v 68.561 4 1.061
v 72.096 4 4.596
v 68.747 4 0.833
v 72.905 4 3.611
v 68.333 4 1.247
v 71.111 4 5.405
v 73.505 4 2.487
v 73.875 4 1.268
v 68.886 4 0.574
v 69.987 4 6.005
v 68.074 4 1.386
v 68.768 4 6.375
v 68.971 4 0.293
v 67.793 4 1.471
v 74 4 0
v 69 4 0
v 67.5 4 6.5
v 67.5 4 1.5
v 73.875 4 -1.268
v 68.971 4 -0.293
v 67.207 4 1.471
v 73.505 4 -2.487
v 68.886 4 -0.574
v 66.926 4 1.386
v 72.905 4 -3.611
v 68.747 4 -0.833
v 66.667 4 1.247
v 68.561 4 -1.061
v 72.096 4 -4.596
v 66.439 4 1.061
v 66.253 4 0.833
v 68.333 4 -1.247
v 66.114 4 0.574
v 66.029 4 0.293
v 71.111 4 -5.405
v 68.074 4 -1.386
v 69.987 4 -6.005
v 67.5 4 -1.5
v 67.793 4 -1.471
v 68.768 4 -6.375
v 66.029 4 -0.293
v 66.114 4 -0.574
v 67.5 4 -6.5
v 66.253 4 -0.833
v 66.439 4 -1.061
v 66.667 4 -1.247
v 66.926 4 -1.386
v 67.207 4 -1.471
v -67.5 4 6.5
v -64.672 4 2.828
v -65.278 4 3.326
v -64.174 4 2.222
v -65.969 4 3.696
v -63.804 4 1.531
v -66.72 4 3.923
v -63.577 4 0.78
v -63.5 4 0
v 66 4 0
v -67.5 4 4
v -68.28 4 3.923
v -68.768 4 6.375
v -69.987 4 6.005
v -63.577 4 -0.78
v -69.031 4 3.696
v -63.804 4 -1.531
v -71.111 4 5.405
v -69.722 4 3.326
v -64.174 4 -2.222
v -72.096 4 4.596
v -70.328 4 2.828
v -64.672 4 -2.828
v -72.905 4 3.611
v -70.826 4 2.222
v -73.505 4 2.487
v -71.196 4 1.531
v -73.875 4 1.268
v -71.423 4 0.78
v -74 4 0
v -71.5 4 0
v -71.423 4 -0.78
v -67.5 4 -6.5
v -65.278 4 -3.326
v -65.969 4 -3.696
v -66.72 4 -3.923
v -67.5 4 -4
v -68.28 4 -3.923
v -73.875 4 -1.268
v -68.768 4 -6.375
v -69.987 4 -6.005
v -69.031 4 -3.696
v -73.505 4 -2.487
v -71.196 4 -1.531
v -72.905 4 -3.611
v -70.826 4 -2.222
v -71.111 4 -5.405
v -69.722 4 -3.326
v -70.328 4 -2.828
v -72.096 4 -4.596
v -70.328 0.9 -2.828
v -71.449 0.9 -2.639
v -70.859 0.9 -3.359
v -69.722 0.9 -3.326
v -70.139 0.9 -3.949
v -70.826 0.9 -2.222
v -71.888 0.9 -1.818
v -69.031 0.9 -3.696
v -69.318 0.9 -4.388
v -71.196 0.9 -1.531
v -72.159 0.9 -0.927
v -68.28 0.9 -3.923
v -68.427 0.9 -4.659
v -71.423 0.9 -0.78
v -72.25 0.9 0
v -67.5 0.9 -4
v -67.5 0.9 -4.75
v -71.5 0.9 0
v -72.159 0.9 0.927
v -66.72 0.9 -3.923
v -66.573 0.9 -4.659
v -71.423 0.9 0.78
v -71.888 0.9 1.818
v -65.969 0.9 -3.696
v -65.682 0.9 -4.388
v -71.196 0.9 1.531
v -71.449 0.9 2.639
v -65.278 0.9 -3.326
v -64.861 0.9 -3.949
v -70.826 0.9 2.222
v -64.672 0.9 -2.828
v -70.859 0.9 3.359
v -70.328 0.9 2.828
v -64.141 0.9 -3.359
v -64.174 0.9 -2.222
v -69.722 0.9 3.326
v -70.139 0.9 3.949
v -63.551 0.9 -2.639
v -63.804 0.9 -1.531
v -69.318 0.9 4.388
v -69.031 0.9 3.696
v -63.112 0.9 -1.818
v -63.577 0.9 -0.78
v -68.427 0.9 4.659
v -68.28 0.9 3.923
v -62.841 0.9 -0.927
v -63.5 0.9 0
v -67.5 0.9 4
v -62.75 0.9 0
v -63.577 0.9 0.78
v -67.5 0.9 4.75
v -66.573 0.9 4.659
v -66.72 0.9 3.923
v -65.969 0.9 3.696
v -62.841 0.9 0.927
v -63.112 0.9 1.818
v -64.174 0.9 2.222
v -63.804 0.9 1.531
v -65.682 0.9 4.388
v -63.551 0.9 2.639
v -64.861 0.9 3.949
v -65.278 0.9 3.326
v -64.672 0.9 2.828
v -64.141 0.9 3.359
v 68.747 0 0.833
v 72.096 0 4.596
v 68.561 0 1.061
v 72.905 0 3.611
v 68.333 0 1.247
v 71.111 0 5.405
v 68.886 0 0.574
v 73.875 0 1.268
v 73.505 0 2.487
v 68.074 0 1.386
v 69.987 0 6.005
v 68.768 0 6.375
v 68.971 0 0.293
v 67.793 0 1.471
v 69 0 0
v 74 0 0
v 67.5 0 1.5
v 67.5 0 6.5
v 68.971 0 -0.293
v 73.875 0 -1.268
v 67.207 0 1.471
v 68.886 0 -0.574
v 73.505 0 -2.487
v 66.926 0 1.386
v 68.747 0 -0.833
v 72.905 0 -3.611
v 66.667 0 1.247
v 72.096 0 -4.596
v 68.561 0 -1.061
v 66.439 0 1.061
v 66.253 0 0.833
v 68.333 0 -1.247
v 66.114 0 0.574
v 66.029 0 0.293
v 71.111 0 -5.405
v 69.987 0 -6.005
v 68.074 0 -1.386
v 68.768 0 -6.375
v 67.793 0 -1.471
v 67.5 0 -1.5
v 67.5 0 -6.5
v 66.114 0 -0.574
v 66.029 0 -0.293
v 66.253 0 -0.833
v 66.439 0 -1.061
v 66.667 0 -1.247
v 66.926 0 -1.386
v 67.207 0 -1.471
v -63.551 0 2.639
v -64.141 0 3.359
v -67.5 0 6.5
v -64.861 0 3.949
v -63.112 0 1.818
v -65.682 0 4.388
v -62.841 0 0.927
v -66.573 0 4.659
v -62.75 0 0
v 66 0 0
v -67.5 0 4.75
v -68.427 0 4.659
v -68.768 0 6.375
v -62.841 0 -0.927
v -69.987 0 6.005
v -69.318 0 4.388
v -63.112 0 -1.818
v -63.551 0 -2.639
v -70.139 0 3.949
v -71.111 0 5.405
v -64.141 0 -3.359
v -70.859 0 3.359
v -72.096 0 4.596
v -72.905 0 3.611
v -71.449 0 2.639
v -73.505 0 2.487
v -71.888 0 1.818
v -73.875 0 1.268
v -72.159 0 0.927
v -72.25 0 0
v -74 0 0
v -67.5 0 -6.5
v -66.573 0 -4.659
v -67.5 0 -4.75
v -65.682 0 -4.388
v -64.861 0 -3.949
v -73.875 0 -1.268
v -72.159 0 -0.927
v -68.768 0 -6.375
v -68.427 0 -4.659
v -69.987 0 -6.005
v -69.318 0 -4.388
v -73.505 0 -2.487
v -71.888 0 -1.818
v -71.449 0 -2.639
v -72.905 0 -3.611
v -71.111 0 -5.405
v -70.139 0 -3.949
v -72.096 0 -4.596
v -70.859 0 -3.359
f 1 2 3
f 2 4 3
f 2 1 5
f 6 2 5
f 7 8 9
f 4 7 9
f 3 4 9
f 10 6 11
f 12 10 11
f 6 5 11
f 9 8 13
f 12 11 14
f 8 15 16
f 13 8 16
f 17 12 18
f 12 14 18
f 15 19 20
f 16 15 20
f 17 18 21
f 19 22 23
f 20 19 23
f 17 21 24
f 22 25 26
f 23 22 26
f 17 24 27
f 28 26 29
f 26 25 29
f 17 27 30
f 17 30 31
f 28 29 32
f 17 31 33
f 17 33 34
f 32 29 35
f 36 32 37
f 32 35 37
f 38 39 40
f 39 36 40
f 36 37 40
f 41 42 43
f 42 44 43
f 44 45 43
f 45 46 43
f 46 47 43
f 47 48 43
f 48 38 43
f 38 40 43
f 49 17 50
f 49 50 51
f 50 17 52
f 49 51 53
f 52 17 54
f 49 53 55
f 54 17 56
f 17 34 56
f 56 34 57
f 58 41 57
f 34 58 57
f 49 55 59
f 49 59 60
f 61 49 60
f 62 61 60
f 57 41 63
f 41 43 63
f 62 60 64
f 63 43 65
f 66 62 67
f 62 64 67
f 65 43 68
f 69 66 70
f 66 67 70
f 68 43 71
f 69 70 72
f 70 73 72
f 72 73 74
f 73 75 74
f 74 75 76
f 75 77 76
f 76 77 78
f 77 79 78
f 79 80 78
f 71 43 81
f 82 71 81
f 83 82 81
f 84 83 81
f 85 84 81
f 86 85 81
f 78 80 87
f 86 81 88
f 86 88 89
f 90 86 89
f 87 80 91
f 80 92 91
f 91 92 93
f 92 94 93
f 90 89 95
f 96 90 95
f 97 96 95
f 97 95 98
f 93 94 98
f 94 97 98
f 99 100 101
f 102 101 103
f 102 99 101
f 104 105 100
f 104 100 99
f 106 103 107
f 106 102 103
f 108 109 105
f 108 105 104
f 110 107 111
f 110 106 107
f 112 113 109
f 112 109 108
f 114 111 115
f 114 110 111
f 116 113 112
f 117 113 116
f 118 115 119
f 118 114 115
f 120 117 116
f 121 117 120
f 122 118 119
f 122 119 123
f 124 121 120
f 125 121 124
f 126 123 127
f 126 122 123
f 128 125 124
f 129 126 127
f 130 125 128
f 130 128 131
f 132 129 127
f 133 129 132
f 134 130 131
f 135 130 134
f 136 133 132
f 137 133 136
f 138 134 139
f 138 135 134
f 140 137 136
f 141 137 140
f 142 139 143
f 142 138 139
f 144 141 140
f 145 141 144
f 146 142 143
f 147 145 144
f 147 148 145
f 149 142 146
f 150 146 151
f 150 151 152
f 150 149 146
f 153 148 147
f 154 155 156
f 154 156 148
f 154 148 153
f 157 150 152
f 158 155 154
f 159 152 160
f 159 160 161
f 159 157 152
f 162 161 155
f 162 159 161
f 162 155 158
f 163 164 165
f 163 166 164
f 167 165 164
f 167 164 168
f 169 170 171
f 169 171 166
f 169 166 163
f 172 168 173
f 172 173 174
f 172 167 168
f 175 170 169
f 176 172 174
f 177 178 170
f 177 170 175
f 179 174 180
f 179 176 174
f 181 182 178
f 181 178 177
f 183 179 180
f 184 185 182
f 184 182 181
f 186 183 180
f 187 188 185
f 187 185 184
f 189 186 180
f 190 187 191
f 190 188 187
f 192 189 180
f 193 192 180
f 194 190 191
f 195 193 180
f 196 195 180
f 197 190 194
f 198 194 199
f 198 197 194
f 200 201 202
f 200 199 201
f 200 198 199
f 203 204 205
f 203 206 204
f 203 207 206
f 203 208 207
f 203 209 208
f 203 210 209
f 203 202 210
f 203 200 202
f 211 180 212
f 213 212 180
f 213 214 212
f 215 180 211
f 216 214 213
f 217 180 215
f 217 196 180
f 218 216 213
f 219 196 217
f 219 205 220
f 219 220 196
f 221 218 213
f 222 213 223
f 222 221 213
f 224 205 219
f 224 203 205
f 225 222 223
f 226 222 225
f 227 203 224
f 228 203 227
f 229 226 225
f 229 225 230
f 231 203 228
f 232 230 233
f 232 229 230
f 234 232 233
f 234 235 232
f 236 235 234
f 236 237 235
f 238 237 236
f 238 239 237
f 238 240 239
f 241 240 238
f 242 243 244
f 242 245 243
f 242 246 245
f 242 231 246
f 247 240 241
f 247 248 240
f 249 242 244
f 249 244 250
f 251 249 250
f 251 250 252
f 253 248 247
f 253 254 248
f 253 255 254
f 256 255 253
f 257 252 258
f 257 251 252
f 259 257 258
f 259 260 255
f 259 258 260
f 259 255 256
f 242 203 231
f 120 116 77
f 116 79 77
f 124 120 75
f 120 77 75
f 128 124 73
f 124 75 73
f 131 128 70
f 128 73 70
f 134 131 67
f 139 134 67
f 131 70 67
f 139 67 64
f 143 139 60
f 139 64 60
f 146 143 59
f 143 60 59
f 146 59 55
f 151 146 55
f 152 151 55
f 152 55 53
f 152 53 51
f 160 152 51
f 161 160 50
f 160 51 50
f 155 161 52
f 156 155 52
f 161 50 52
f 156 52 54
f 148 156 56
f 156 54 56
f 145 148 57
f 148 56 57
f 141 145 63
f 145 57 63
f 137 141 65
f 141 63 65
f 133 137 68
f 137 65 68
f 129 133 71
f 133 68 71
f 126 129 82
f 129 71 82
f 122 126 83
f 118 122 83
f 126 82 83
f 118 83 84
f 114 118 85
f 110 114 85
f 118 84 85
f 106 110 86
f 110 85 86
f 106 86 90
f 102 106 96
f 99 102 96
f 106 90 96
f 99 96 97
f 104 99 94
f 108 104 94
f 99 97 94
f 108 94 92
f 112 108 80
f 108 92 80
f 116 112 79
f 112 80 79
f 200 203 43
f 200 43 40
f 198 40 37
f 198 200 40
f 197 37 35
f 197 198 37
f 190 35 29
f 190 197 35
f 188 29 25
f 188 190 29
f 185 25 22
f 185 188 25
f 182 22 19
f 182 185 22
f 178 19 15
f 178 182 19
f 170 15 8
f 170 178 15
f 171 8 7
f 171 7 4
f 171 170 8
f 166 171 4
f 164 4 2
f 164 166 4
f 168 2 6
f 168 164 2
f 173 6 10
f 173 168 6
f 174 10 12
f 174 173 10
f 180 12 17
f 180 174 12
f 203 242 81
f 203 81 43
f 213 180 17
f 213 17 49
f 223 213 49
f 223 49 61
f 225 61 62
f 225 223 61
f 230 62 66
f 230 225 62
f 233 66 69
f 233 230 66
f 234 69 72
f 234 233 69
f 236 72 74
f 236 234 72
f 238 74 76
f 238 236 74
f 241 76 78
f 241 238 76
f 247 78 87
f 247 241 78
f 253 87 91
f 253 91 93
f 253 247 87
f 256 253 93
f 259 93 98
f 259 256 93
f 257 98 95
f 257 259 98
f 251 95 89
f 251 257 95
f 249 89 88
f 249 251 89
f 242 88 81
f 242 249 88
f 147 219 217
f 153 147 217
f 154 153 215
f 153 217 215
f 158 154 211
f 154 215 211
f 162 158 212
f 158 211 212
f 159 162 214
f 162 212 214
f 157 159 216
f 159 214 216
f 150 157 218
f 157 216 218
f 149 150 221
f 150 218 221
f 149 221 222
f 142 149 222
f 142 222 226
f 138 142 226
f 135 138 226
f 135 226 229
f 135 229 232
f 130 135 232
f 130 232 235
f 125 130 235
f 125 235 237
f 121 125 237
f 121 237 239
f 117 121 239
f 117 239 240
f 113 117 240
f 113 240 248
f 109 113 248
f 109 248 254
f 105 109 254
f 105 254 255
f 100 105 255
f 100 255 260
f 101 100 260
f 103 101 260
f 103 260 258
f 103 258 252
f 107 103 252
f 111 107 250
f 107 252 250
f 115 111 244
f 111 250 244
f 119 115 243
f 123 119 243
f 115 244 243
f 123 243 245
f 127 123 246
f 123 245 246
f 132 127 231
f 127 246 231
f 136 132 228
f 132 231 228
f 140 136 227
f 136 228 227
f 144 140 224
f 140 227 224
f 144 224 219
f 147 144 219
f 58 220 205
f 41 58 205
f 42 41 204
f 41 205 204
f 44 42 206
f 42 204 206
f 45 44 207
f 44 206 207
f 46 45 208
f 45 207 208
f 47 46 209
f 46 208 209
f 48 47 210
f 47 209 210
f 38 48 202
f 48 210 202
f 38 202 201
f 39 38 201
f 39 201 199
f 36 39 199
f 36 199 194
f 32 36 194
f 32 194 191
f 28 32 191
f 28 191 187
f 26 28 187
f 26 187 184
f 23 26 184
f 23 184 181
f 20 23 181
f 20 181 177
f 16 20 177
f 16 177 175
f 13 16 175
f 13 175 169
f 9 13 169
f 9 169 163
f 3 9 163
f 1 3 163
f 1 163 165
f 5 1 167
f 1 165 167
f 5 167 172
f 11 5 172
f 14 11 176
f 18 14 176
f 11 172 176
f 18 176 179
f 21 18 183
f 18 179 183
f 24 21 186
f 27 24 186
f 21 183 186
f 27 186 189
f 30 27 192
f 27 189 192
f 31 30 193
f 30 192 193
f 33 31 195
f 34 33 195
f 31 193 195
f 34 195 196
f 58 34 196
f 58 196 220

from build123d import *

# Parameters (mm, degrees)
EXTRUDE_1_DEPTH              = 4
HOLE_WIZARD_M5_1_D           = 8
HOLE_WIZARD_M5_1_DEPTH       = 12.4
HOLE_WIZARD_M5_1_CBORE_D     = 9.5
HOLE_WIZARD_M5_1_CBORE_DEPTH = 0.9
HOLE_WIZARD_M5_1_TIP         = 2.403442476
HOLE_WIZARD_M3_1_D           = 3
HOLE_WIZARD_M3_1_DEPTH       = 7.5
HOLE_WIZARD_M3_1_TIP         = 0.901290929


with BuildPart() as part:
    # 草图1 → 凸台-拉伸1 (new body)
    with BuildSketch(Plane(origin=(0, 0, 0), x_dir=(1, 0, 0), z_dir=(0, 1, 0))):
        with BuildLine():
            Line((-67.5, 6.5), (67.5, 6.5))
            ThreePointArc((67.5, 6.5), (74, 0), (67.5, -6.5))
            Line((67.5, -6.5), (-67.5, -6.5))
            ThreePointArc((-67.5, -6.5), (-74, 0), (-67.5, 6.5))
        make_face()
    extrude(amount=EXTRUDE_1_DEPTH)

    # M5 六角头螺栓的柱形沉头孔1
    with Locations(Plane.XZ):
        with Locations((-67.5, 0)):
            CounterBoreHole(HOLE_WIZARD_M5_1_D / 2, HOLE_WIZARD_M5_1_CBORE_D / 2, HOLE_WIZARD_M5_1_CBORE_DEPTH, depth=HOLE_WIZARD_M5_1_DEPTH)
            with Locations((0, 0, -(HOLE_WIZARD_M5_1_DEPTH + HOLE_WIZARD_M5_1_TIP / 2))):  # 118° drill point
                Cone(0, HOLE_WIZARD_M5_1_D / 2, HOLE_WIZARD_M5_1_TIP, mode=Mode.SUBTRACT)

    # M3 螺纹孔1
    with Locations(Plane(origin=(0, 4, 0), x_dir=(1, 0, 0), z_dir=(0, 1, 0))):
        with Locations((67.5, 0)):
            Hole(HOLE_WIZARD_M3_1_D / 2, depth=HOLE_WIZARD_M3_1_DEPTH)
            with Locations((0, 0, -(HOLE_WIZARD_M3_1_DEPTH + HOLE_WIZARD_M3_1_TIP / 2))):  # 118° drill point
                Cone(0, HOLE_WIZARD_M3_1_D / 2, HOLE_WIZARD_M3_1_TIP, mode=Mode.SUBTRACT)


solid = part.part
